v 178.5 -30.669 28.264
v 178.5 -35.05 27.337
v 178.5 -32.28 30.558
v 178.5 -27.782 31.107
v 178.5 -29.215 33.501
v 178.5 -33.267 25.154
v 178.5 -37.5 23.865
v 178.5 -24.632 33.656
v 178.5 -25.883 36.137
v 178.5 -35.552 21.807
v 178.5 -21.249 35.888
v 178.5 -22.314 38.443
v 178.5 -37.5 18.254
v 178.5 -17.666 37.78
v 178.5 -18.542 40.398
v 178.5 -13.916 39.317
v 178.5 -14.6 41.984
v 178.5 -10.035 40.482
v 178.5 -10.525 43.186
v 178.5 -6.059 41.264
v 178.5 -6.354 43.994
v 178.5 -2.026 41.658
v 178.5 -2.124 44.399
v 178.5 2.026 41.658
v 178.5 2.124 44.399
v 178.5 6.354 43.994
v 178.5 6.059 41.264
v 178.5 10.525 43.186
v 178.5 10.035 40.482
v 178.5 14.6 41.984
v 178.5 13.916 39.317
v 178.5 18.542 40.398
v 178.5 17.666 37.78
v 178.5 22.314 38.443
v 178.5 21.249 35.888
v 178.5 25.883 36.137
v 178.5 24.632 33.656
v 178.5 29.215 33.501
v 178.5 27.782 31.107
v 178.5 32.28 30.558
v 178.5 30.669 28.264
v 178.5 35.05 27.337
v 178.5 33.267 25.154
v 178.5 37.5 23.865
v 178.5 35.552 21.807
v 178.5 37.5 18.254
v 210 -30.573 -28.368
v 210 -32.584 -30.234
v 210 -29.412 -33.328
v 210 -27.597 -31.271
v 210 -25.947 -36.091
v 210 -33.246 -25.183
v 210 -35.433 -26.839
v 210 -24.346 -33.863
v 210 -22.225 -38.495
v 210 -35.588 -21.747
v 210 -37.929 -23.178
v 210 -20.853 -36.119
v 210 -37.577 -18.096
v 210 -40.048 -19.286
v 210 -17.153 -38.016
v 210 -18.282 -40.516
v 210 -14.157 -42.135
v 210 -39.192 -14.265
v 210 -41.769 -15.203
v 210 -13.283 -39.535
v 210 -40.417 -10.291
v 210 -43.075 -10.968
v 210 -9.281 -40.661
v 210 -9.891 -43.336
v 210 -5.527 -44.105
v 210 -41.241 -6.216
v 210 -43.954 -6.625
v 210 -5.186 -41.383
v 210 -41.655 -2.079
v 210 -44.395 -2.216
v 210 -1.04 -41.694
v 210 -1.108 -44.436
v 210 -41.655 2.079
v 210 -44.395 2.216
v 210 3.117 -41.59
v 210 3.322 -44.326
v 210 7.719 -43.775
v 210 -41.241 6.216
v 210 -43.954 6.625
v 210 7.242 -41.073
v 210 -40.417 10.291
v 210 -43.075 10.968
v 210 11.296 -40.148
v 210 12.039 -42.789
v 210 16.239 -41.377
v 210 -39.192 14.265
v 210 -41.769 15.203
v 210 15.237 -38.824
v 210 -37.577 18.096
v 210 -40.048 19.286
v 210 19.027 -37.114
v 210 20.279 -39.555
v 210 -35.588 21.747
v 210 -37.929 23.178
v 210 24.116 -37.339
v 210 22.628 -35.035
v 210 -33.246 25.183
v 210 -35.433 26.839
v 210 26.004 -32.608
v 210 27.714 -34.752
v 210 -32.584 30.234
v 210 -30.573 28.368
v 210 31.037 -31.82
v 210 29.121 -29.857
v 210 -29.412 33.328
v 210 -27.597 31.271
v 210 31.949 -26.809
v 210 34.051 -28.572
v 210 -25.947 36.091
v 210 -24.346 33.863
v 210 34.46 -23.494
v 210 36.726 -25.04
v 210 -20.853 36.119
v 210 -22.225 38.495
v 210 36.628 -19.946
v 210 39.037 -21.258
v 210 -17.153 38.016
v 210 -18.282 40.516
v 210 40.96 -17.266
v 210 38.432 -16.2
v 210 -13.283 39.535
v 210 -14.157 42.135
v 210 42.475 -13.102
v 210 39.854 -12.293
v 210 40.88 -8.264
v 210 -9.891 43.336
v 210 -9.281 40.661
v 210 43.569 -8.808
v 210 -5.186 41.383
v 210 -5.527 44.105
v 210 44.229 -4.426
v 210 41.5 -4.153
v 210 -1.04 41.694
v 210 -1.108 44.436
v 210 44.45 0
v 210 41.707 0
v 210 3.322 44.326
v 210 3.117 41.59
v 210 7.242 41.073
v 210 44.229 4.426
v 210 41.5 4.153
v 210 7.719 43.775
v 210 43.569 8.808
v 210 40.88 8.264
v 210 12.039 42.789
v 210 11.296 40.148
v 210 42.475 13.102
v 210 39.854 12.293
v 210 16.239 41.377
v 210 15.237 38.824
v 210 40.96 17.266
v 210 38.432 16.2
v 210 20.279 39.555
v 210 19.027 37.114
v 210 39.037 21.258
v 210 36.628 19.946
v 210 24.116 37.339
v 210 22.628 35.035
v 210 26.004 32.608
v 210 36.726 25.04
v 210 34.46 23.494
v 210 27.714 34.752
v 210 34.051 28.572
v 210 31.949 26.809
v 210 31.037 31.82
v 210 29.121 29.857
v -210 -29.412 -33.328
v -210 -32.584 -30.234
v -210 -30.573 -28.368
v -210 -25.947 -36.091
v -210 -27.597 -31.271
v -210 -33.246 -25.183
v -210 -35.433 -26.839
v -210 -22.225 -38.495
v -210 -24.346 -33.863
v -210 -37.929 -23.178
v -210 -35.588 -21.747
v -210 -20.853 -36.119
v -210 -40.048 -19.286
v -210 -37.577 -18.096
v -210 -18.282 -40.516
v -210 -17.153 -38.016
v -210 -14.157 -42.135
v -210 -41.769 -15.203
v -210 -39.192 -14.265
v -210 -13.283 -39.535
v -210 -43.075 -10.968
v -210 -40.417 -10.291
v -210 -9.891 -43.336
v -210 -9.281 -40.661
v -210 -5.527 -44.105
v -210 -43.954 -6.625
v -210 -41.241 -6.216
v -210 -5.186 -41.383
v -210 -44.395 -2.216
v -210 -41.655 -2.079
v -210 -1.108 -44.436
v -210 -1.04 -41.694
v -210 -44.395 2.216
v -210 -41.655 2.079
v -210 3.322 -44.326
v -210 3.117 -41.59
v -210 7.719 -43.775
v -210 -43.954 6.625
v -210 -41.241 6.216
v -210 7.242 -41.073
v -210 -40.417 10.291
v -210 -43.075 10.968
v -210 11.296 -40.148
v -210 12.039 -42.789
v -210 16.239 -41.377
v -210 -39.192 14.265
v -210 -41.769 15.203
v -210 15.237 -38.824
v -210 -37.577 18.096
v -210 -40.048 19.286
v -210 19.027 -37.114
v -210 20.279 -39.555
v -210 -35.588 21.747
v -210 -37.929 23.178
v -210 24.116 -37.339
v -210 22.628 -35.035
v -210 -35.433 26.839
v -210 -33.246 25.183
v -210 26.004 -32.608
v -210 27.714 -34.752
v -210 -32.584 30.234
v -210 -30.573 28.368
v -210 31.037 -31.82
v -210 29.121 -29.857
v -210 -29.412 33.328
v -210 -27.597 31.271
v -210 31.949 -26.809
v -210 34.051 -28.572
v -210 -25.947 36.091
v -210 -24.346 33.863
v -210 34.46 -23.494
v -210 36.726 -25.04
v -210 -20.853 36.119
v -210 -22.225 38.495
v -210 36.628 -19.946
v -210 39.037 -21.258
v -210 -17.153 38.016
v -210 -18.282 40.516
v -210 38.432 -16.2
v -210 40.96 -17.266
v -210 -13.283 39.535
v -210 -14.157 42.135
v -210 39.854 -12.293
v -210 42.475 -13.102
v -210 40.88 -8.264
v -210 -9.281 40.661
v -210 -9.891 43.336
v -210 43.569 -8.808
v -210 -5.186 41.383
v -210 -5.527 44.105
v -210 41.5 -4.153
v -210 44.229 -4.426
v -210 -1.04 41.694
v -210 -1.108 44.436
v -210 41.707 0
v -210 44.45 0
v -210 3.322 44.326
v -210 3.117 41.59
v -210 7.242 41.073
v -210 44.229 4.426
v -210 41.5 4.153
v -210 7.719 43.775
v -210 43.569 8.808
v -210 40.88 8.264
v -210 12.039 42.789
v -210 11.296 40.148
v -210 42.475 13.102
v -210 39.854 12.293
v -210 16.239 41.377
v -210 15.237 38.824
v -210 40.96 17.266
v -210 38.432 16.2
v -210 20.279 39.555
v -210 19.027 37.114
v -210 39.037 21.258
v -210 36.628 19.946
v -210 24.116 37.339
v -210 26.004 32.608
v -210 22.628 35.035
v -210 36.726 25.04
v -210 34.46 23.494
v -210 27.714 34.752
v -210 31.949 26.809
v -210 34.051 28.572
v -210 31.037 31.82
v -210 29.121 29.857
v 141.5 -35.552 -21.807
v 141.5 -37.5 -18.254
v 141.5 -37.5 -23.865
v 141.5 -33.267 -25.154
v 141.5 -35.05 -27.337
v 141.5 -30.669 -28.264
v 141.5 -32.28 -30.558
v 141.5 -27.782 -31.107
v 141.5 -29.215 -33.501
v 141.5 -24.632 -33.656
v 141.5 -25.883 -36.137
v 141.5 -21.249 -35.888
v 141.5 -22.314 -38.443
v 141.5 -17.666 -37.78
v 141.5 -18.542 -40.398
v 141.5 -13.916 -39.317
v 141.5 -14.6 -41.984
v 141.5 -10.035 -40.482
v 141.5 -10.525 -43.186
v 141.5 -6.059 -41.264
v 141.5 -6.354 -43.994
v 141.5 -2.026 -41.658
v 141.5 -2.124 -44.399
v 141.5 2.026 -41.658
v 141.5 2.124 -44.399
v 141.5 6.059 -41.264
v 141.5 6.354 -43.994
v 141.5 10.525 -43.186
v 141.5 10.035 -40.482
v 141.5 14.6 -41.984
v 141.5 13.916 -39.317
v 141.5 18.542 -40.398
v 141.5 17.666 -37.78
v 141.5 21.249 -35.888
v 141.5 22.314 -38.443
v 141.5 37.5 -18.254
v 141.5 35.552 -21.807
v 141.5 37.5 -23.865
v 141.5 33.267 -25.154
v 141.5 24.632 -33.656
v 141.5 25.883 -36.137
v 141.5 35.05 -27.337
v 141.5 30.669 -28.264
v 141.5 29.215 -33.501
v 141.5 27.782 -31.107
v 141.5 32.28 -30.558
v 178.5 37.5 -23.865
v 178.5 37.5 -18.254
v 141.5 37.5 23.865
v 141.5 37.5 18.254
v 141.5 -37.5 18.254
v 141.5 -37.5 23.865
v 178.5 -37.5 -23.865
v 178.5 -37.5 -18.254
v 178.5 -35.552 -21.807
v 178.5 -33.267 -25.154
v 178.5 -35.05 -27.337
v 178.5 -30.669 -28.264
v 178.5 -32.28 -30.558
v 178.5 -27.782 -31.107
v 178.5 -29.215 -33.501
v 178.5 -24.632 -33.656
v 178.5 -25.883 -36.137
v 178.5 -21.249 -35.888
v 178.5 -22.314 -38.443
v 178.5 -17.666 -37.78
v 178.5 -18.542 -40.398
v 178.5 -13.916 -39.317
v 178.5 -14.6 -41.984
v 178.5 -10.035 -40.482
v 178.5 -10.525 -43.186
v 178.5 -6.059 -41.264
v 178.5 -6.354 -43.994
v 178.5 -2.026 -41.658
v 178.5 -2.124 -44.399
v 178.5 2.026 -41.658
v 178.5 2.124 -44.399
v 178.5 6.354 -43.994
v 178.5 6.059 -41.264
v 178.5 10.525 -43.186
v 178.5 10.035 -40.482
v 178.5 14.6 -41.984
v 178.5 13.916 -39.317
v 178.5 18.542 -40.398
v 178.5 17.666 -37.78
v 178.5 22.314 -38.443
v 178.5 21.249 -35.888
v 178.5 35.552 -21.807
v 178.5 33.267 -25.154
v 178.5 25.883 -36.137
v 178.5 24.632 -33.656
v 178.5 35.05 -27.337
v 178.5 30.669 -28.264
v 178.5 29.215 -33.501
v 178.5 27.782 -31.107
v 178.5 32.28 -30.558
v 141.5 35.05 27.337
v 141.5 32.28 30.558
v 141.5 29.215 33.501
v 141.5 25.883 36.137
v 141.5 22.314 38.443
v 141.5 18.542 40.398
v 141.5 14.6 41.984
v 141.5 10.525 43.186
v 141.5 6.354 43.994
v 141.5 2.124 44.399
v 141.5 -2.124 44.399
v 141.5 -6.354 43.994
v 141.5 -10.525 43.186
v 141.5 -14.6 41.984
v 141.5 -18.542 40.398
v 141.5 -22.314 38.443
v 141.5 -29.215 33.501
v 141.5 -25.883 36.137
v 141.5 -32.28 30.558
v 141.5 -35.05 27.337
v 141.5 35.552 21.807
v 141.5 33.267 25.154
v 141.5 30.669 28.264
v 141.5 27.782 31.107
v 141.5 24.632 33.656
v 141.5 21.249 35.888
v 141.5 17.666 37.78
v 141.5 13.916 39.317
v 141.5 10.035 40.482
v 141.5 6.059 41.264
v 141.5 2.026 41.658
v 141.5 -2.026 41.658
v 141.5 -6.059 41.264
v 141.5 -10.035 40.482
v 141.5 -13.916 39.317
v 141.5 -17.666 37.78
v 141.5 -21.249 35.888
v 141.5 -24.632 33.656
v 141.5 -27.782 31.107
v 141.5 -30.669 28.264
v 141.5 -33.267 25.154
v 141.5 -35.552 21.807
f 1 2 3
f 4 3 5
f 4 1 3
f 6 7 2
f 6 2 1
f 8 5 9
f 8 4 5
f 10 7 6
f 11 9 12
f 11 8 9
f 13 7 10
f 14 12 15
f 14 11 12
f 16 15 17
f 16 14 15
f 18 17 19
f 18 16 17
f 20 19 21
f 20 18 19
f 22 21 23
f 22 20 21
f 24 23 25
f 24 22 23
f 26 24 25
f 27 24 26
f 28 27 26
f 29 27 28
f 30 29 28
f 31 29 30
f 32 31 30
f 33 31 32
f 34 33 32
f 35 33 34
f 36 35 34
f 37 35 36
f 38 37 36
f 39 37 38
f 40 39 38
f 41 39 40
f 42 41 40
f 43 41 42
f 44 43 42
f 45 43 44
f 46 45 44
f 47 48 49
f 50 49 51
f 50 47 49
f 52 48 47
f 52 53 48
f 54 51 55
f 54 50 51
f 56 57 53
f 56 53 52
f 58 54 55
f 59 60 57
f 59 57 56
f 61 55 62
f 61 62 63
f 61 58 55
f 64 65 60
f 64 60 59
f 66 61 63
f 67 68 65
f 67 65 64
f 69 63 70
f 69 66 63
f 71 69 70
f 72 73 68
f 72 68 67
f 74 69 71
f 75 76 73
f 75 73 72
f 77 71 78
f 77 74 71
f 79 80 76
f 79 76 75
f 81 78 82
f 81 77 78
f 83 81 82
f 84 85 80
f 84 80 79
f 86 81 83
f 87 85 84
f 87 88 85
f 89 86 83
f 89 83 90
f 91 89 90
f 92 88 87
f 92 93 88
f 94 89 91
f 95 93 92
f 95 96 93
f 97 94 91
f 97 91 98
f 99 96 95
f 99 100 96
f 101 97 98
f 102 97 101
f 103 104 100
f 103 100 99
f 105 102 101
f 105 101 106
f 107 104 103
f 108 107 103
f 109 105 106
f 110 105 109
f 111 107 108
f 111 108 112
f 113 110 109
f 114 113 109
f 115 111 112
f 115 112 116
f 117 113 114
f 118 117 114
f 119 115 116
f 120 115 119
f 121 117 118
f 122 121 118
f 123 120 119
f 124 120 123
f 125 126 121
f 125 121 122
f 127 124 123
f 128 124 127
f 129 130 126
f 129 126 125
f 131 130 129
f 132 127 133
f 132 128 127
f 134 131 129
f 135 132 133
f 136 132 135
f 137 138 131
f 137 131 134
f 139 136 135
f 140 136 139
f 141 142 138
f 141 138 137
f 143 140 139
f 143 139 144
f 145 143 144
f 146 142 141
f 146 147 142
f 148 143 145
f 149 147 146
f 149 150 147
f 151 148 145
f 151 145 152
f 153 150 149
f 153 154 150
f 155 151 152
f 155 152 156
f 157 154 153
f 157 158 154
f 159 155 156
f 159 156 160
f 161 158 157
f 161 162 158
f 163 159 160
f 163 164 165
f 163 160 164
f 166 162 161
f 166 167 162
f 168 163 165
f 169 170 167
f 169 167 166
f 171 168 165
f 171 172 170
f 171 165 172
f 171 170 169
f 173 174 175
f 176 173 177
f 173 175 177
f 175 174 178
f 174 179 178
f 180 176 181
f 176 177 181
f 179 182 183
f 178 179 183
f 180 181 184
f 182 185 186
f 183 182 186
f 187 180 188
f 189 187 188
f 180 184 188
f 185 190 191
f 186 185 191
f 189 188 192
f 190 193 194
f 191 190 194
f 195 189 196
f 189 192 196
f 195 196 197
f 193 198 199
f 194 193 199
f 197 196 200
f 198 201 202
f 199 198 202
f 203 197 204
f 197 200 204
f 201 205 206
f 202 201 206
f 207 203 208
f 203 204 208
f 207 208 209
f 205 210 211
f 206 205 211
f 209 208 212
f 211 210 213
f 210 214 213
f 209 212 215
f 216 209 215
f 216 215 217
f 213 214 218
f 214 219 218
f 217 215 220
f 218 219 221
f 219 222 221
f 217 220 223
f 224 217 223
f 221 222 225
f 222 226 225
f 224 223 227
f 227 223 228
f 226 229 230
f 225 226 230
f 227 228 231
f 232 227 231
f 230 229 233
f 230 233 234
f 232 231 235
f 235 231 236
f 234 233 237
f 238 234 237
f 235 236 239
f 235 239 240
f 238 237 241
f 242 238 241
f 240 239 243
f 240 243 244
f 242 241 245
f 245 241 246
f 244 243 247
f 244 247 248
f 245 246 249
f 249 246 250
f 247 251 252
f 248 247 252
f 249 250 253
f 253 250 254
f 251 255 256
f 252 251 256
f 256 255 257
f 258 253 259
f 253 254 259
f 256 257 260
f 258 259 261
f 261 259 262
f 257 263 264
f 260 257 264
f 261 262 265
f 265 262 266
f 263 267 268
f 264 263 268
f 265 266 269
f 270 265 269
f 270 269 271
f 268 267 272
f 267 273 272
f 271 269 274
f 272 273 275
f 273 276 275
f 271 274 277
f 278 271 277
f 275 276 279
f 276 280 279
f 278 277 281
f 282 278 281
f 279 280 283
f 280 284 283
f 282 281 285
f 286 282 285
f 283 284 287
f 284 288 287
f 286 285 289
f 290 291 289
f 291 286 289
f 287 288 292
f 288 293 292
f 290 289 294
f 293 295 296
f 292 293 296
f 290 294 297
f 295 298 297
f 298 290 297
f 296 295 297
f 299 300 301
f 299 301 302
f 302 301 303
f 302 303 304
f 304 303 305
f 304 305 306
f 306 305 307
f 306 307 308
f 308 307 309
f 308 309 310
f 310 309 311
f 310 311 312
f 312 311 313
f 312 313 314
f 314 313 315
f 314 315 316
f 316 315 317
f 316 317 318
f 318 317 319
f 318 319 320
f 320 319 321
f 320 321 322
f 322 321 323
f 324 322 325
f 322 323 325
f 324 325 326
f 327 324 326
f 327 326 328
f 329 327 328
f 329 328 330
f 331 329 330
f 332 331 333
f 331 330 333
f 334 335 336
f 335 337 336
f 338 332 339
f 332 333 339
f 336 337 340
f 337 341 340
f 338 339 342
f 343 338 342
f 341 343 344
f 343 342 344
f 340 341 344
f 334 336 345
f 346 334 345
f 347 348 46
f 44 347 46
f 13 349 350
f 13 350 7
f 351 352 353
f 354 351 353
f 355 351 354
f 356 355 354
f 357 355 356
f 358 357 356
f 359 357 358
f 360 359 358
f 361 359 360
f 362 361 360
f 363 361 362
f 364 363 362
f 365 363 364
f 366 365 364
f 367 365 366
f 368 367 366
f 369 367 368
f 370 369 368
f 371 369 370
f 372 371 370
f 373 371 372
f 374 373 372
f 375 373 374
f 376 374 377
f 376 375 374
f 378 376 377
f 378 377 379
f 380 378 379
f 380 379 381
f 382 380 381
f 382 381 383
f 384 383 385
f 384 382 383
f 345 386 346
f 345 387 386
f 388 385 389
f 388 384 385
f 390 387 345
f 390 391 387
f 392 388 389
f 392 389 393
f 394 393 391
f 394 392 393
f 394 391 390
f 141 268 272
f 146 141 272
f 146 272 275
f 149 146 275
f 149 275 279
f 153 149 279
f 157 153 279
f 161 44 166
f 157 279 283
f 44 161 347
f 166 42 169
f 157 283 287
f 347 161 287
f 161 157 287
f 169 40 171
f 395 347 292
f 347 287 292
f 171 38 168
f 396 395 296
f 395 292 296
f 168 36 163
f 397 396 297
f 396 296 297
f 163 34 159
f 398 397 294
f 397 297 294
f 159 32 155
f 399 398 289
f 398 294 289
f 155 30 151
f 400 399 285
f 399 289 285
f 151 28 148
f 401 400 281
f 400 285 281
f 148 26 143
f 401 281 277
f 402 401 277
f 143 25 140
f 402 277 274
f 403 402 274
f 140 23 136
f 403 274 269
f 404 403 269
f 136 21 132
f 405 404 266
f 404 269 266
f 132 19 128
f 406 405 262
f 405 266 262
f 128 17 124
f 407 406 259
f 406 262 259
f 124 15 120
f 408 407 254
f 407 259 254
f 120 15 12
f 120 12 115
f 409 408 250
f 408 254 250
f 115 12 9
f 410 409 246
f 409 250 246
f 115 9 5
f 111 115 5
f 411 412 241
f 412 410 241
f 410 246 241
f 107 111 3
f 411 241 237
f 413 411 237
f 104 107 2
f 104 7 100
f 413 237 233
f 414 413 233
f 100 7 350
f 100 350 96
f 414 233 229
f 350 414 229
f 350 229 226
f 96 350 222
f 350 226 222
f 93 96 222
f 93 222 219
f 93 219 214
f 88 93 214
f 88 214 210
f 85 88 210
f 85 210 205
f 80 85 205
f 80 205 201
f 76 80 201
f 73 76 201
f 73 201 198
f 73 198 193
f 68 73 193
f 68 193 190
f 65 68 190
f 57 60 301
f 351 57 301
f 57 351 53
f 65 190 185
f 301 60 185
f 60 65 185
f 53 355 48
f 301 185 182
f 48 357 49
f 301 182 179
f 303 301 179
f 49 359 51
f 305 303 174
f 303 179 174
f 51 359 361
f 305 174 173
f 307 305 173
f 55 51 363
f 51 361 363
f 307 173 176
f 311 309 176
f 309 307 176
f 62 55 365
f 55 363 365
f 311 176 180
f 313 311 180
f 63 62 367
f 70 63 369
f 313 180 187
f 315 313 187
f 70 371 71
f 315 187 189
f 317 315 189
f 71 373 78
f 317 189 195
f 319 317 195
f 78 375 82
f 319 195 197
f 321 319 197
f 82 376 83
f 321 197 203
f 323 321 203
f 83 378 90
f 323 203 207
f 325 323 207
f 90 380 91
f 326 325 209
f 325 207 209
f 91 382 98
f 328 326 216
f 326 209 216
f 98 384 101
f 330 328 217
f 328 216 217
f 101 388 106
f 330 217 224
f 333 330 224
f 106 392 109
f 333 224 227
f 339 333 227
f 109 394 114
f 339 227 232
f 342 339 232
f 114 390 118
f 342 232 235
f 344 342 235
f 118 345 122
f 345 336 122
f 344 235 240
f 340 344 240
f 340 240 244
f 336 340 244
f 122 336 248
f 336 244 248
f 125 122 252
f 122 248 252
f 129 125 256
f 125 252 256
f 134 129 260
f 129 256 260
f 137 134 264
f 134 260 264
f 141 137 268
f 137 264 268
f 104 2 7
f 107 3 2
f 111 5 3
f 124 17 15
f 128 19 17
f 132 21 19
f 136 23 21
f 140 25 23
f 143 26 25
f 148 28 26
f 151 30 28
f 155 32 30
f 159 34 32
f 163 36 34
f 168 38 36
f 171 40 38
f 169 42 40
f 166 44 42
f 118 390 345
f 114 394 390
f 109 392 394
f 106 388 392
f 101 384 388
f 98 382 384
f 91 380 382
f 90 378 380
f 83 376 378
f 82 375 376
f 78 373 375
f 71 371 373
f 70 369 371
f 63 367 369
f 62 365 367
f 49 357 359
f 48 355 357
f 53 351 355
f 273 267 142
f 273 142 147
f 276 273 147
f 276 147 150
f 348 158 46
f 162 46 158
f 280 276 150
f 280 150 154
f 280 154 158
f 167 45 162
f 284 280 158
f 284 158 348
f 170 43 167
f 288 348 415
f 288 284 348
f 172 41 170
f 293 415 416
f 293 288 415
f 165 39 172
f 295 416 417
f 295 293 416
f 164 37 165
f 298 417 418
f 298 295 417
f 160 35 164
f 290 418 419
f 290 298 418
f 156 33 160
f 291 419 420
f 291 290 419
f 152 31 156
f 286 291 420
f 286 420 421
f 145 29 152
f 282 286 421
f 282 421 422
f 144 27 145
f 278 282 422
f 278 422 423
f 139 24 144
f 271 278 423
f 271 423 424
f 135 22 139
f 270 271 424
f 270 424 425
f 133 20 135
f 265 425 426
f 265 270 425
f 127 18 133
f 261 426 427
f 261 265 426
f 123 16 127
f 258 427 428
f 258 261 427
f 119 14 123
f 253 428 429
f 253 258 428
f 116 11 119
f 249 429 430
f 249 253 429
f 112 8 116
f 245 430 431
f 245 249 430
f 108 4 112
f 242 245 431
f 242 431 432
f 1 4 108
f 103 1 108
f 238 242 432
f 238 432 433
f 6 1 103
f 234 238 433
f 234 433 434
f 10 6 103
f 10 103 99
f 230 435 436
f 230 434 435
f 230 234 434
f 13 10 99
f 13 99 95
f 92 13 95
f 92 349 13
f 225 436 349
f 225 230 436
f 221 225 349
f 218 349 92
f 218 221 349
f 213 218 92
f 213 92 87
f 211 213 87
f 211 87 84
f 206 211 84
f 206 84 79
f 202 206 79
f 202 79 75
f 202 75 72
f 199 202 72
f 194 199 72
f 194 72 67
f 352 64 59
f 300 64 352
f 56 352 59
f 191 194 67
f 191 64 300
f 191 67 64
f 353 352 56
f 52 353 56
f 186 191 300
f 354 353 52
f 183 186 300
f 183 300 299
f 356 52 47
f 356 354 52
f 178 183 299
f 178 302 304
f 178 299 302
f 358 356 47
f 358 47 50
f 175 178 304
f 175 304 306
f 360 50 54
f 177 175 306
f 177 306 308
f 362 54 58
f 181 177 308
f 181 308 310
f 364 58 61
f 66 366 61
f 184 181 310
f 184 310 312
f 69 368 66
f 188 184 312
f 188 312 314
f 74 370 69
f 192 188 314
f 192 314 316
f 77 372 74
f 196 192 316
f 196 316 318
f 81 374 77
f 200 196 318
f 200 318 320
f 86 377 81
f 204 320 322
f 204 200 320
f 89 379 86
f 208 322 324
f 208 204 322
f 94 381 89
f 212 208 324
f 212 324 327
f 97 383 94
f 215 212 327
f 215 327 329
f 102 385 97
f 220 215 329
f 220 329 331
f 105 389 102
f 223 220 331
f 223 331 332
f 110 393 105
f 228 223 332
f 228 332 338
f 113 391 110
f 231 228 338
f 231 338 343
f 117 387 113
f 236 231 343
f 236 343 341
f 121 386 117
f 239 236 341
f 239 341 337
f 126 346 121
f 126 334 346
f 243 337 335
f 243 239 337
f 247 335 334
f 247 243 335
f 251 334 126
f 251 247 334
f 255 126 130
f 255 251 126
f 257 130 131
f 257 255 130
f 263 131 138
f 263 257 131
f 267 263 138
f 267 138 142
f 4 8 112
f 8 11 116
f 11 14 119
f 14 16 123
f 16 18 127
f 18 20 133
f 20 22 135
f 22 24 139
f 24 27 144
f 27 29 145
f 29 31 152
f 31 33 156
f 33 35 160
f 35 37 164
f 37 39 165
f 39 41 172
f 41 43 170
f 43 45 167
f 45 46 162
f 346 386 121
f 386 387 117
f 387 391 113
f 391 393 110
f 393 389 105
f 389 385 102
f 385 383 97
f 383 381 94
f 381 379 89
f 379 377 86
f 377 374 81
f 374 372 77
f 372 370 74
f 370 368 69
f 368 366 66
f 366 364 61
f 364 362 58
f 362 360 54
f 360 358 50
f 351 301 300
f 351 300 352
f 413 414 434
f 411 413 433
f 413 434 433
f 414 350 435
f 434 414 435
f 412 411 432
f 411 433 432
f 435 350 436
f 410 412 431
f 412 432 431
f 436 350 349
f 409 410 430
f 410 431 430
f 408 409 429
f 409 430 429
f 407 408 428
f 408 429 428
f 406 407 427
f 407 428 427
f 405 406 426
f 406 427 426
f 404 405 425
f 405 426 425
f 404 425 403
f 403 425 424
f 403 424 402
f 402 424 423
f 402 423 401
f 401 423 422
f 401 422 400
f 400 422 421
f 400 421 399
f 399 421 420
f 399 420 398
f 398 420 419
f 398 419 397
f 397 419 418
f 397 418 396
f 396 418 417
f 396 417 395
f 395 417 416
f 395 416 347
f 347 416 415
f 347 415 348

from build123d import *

# Parameters (mm, degrees)
SKETCH12_R              = 44.45
SKETCH12_R_2            = 41.7068
PIPE_0_5_SCH_40_1_DEPTH = 420
CUT_EXTRUDE1_DEPTH      = 50
CUT_EXTRUDE1_DEPTH_BACK = 50
SKETCH13_W              = 37
SKETCH13_H              = 75


with BuildPart() as part:
    # Sketch12 → Pipe 0.5 SCH 40(1) (new body)
    with BuildSketch(Plane.YZ.offset(-210)):
        Circle(SKETCH12_R)
        Circle(SKETCH12_R_2, mode=Mode.SUBTRACT)
    extrude(amount=PIPE_0_5_SCH_40_1_DEPTH)

    # Sketch13 → Cut-Extrude1 (cut, two sides: drawn at the far end of the back side and taken through both)
    with BuildSketch(Plane.XY.offset(-CUT_EXTRUDE1_DEPTH_BACK)):
        with Locations((160, 0)):
            Rectangle(SKETCH13_W, SKETCH13_H)
    extrude(amount=CUT_EXTRUDE1_DEPTH + CUT_EXTRUDE1_DEPTH_BACK, mode=Mode.SUBTRACT)


solid = part.part
